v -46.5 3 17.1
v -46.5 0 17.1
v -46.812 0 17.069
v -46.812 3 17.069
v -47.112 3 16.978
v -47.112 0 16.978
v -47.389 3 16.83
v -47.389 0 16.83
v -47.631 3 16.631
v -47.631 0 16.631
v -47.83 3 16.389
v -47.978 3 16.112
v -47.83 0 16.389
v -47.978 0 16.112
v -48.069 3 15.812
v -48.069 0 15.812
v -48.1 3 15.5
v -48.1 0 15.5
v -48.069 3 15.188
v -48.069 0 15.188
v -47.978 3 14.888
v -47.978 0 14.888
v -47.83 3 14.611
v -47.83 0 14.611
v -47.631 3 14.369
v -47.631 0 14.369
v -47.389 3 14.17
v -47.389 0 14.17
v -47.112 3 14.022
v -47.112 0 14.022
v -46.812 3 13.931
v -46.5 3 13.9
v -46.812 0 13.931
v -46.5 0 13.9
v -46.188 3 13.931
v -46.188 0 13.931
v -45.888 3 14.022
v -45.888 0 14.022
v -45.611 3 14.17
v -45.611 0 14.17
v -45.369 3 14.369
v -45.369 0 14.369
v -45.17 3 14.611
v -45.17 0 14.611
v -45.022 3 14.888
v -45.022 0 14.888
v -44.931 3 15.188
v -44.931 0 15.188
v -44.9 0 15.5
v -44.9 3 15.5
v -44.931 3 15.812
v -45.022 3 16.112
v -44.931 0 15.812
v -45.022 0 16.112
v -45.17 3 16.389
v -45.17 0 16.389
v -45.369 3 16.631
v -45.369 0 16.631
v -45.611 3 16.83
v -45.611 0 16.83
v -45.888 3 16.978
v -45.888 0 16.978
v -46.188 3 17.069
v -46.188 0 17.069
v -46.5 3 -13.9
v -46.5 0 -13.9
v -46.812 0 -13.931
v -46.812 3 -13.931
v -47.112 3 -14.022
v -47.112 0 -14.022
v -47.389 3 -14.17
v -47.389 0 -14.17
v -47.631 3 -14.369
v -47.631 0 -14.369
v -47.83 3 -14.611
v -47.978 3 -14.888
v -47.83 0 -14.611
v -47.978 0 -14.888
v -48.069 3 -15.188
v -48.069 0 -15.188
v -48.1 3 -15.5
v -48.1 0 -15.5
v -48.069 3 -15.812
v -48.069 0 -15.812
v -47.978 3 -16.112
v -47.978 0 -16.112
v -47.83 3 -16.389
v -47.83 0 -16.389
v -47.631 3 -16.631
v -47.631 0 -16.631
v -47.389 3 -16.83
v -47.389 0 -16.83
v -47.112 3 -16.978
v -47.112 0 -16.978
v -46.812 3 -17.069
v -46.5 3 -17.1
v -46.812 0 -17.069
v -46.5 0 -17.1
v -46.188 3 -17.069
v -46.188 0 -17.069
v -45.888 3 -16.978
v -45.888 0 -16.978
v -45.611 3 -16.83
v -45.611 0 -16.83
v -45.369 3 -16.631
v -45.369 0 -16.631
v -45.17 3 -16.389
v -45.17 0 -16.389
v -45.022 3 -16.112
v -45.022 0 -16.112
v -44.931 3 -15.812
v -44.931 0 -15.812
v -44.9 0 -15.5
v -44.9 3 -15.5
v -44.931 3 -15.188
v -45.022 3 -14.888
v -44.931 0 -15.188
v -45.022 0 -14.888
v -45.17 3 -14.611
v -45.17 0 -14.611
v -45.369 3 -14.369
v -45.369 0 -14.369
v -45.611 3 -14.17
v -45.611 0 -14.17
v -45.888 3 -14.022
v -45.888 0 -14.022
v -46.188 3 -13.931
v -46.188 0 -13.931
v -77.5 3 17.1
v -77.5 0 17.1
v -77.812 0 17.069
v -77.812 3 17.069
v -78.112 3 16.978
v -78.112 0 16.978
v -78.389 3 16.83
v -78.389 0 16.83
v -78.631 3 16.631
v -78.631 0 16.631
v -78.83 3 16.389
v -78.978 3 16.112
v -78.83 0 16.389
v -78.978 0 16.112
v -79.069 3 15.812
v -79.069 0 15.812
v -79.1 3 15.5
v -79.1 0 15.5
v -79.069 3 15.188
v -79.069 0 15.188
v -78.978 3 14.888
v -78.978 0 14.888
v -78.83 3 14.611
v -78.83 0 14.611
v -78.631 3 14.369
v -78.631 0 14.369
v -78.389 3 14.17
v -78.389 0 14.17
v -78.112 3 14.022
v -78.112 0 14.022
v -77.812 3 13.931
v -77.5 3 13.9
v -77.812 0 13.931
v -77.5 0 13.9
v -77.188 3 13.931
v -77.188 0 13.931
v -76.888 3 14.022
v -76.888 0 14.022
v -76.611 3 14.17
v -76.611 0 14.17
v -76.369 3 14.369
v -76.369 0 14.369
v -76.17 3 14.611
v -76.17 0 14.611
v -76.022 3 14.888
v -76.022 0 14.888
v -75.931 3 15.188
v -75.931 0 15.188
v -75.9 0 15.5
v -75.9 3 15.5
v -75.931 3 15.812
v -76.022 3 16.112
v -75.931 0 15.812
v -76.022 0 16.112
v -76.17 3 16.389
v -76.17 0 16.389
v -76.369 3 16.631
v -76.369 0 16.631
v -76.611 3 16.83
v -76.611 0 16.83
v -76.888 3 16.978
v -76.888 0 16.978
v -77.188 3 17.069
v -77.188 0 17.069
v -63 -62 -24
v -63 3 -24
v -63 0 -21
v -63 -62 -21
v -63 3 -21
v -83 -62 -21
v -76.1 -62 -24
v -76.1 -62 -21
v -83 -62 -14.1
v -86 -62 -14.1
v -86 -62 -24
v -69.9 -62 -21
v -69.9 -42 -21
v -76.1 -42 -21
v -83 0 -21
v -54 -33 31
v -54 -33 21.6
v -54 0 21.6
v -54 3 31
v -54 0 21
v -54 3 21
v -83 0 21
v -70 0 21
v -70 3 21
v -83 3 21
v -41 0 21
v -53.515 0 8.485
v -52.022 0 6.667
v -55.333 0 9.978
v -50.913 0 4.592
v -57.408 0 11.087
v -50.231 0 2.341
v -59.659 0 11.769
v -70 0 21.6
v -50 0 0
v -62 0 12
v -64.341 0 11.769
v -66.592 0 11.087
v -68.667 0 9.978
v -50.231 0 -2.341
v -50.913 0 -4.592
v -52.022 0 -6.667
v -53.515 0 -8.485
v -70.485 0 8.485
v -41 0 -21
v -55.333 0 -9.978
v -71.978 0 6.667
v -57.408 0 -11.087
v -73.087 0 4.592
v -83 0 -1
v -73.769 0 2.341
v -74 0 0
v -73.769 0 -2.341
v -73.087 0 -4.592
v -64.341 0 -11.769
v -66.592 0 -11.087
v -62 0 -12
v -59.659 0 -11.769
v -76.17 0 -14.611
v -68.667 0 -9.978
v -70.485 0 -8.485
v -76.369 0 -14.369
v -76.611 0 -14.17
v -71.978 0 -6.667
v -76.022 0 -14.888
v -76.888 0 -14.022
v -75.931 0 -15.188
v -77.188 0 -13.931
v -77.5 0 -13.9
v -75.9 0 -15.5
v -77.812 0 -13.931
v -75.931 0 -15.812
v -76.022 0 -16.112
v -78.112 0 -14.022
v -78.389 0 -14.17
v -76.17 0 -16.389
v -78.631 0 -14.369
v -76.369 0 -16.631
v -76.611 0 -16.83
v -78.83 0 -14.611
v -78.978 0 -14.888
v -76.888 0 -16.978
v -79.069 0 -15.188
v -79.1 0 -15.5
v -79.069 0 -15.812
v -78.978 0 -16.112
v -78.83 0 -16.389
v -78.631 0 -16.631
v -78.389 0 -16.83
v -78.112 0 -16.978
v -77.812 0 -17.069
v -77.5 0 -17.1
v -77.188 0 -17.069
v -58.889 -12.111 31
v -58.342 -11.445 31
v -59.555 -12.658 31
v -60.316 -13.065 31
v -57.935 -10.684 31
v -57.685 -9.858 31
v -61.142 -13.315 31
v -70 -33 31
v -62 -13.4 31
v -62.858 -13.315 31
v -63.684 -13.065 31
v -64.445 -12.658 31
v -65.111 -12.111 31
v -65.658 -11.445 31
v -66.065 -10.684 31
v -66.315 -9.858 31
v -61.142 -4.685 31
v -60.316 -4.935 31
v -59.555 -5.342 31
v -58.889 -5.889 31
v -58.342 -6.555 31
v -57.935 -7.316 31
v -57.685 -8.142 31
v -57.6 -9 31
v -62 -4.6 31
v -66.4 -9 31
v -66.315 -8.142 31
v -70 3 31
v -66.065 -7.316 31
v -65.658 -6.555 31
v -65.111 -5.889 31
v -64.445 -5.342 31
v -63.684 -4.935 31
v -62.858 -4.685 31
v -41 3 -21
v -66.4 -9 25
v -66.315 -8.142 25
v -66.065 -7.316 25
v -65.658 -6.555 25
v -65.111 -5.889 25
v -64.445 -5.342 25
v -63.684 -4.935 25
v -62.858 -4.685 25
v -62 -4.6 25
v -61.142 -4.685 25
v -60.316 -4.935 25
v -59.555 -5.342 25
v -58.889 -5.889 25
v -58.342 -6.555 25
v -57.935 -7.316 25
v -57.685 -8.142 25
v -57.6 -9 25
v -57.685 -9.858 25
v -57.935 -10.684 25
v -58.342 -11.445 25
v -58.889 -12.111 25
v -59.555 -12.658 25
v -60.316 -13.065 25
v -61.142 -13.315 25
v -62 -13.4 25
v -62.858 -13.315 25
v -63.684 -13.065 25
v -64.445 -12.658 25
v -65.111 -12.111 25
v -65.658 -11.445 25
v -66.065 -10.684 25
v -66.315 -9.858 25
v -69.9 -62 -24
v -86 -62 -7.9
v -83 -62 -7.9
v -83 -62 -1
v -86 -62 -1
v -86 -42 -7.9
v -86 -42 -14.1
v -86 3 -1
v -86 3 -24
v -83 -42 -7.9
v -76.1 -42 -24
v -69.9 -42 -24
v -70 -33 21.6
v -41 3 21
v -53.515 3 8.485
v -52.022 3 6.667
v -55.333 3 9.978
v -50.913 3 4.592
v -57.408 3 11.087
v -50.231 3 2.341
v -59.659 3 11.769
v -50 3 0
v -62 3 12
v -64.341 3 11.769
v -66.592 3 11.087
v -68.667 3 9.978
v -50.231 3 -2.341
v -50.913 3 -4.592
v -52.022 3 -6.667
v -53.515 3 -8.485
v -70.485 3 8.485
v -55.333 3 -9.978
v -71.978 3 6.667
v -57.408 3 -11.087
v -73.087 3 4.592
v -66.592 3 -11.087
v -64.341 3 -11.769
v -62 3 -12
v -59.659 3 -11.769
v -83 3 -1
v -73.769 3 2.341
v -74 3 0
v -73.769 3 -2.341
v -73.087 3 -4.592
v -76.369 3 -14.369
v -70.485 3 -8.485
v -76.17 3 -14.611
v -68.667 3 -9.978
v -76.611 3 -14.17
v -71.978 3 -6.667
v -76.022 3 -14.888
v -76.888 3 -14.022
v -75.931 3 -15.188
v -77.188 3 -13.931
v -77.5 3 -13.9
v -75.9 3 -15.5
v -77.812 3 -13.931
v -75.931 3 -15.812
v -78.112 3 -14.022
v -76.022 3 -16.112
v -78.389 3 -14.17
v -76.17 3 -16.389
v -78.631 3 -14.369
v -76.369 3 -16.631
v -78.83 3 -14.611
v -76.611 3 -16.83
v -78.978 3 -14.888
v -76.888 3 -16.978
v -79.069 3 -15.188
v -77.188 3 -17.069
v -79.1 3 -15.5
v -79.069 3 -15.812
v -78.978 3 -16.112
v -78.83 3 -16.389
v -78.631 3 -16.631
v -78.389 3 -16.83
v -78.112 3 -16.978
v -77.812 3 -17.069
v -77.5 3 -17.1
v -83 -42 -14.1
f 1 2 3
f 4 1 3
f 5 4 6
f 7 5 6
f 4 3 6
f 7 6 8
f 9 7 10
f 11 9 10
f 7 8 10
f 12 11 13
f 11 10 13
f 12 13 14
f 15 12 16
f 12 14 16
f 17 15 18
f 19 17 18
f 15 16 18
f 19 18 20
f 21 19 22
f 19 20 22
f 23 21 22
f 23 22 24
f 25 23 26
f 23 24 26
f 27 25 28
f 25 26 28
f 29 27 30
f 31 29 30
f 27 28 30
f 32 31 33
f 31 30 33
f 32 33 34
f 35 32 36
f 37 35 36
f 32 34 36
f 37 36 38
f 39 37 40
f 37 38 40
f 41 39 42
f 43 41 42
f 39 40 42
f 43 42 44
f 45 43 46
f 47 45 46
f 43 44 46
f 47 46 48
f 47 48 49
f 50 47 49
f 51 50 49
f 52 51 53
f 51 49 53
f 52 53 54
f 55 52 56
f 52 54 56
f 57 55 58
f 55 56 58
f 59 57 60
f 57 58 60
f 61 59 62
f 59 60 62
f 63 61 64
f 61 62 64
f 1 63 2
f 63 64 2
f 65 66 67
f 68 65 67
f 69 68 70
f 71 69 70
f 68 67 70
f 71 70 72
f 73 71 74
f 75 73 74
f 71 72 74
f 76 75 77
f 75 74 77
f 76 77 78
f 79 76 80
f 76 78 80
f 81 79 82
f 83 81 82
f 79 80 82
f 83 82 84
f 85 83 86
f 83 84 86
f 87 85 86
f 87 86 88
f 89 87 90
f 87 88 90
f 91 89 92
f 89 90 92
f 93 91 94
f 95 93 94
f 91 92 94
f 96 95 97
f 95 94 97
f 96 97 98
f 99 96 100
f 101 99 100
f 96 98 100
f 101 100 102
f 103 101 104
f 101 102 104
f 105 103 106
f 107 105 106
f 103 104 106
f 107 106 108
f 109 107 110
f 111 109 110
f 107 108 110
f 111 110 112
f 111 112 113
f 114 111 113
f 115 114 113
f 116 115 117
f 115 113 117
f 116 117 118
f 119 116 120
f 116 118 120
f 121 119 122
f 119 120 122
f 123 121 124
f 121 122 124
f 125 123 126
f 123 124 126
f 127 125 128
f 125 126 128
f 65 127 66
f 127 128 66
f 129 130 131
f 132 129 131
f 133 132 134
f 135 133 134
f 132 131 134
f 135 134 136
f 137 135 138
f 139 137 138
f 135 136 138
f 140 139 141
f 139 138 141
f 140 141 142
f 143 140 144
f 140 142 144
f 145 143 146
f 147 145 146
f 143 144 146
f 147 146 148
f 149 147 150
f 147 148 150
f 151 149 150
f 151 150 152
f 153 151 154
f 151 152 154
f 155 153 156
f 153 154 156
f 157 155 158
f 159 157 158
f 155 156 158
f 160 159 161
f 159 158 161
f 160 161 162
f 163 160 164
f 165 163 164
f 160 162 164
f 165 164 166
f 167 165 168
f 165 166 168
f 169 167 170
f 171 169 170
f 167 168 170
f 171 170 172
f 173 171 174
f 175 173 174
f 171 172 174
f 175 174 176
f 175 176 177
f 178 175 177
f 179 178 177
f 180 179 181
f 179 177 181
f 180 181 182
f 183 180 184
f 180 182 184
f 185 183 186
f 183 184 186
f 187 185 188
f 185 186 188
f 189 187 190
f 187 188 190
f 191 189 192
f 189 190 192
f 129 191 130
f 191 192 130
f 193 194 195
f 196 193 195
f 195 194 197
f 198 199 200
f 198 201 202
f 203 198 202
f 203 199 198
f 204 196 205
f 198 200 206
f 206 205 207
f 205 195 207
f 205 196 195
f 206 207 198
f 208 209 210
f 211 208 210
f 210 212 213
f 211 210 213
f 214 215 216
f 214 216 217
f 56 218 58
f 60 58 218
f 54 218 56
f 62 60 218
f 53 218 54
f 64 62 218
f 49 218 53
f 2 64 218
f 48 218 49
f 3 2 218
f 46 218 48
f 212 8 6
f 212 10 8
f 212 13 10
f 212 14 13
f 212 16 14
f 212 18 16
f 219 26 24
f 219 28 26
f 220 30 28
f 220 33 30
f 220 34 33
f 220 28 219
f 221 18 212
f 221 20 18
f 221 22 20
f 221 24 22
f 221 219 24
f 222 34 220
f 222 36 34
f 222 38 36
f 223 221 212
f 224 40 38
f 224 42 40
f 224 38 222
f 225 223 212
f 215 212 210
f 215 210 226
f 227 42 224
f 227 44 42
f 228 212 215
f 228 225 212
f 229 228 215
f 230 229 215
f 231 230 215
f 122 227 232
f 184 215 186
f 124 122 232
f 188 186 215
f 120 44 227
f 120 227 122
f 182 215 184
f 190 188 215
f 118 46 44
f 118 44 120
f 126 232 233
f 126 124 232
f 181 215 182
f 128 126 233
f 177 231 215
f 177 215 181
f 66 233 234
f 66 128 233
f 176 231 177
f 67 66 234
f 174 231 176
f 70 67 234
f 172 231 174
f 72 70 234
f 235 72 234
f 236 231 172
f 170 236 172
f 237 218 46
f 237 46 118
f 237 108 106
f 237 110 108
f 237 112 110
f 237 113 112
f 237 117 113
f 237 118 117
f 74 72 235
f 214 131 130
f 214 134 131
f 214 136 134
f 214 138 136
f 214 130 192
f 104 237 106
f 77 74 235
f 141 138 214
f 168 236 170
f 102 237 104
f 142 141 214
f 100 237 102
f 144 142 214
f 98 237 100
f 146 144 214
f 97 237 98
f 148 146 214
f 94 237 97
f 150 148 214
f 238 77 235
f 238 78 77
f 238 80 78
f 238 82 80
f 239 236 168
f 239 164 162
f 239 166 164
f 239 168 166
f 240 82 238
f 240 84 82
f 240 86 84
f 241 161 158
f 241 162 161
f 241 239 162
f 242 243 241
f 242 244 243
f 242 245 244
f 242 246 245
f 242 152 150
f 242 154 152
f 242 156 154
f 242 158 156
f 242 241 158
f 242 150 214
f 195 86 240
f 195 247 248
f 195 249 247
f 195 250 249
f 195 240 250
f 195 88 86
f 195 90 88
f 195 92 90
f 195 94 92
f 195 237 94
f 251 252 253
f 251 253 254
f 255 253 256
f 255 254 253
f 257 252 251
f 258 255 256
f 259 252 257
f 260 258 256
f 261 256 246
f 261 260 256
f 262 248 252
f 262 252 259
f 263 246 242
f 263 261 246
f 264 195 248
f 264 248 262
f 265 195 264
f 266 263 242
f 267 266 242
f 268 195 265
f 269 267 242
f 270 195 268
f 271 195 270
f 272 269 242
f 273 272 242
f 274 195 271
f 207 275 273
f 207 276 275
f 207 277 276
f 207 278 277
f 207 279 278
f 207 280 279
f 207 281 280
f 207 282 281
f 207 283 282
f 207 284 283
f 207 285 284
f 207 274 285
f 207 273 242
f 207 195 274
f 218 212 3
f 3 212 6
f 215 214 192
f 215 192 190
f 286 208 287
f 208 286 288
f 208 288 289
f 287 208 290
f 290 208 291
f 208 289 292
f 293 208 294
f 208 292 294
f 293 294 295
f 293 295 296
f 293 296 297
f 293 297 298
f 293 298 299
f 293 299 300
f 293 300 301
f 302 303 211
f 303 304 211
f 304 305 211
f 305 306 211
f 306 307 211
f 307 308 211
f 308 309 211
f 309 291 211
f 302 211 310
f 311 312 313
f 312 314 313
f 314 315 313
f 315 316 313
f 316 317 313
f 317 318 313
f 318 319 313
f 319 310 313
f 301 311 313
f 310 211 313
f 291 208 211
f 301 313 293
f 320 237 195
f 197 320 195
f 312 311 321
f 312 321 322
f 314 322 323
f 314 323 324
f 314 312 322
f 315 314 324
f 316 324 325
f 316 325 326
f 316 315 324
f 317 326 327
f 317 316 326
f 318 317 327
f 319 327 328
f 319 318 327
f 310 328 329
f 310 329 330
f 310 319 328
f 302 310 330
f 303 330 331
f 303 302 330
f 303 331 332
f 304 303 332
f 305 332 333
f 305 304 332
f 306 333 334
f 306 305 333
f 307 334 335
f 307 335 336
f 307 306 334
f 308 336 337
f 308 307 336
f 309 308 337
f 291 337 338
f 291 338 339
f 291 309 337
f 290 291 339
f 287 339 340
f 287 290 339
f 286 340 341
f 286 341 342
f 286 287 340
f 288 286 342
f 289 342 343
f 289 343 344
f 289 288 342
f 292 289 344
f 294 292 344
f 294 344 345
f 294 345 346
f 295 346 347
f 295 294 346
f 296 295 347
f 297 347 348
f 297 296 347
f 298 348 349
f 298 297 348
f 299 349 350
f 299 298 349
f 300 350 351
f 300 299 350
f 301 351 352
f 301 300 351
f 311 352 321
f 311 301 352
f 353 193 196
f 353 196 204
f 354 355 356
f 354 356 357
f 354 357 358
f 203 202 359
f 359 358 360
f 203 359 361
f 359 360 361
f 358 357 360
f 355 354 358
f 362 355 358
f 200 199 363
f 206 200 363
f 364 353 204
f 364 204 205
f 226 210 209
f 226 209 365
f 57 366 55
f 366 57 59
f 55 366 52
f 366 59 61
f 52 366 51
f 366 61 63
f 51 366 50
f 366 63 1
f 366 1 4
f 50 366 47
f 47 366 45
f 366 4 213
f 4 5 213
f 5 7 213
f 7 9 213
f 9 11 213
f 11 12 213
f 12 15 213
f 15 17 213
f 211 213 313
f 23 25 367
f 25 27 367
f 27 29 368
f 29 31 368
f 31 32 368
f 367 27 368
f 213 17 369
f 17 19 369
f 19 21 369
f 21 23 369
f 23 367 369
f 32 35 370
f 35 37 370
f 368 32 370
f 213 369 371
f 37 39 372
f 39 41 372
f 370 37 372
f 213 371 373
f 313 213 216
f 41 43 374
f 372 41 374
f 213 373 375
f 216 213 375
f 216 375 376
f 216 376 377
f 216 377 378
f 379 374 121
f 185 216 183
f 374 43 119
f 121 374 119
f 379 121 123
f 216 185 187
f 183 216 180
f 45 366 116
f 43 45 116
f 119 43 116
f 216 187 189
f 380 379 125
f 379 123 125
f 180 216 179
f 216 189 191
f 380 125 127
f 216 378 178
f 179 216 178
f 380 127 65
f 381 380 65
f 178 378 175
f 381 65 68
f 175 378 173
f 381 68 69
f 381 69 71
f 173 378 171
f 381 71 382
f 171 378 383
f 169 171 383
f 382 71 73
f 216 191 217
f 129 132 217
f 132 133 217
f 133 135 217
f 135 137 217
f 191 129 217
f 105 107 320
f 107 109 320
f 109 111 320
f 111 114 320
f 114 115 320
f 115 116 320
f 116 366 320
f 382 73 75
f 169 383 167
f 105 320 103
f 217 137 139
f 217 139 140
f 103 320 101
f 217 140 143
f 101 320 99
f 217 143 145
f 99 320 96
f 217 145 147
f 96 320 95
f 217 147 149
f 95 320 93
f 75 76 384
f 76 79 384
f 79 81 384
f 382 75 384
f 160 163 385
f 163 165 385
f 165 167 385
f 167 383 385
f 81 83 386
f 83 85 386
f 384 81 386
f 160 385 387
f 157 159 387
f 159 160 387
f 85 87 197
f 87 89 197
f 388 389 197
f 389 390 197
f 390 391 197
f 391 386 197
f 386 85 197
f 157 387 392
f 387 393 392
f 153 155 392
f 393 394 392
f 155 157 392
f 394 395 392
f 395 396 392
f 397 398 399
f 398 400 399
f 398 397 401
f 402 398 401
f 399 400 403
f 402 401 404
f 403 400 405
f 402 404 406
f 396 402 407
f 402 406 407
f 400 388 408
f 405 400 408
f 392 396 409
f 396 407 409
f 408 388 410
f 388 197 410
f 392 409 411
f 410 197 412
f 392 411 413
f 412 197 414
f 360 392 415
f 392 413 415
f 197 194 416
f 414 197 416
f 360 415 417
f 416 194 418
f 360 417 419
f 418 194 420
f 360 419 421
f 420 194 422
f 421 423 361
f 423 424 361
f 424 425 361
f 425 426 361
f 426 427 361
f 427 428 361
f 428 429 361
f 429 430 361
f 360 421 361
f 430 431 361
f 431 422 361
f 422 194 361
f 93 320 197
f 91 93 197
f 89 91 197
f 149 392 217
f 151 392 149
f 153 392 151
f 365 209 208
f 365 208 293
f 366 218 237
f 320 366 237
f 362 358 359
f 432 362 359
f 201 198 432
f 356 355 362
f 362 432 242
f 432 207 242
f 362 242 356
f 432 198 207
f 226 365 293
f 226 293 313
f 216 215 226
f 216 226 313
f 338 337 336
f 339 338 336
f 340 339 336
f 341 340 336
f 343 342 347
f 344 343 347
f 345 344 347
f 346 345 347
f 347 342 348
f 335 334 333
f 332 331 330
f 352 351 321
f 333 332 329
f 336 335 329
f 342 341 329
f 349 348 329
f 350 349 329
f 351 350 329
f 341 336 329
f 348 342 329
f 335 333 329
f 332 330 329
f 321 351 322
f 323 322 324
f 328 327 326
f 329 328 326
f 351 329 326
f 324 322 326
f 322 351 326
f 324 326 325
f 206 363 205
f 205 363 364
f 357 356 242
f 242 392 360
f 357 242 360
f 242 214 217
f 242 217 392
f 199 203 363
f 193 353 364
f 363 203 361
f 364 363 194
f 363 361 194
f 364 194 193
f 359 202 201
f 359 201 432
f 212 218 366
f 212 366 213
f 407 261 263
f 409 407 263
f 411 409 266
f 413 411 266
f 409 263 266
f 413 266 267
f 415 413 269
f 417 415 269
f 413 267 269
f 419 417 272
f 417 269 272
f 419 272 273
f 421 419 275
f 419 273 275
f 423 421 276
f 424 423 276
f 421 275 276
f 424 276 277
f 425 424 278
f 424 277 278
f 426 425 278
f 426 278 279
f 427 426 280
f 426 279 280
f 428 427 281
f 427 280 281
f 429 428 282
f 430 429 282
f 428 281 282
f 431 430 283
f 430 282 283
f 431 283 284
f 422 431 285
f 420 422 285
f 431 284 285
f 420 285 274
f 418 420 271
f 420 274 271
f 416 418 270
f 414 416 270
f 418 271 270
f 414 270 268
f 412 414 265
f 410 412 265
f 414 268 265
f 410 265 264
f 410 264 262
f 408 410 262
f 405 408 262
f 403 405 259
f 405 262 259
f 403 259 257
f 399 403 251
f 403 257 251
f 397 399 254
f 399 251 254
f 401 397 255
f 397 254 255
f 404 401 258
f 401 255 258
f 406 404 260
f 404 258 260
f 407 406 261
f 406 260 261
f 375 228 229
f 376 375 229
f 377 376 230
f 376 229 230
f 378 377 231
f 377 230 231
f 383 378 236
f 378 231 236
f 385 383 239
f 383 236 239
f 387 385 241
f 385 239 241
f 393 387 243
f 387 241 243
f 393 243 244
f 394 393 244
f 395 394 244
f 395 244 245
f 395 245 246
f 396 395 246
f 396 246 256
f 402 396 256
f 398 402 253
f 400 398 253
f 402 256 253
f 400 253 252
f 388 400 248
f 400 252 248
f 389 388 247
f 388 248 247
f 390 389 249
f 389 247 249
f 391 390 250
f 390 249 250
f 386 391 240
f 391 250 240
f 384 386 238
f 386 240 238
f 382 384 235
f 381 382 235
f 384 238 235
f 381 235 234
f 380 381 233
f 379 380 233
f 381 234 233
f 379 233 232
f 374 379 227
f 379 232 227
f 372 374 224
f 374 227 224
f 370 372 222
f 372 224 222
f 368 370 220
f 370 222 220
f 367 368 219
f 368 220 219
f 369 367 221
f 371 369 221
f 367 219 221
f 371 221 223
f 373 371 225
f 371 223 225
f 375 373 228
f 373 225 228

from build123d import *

# Parameters (mm, degrees)
SKETCH_1_W          = 42
SKETCH_1_H          = 42
SKETCH_1_R          = 1.6
SKETCH_1_R_2        = 12
EXTRUDE_1_DEPTH     = 3
SKETCH_2_W          = 16
SKETCH_2_H          = 36
EXTRUDE_2_DEPTH     = 10
SKETCH_3_R          = 4.4
CUT_EXTRUDE_1_DEPTH = 6
EXTRUDE_3_DEPTH     = 65
SKETCH_5_W          = 6.2
SKETCH_5_H          = 20
CUT_EXTRUDE_2_DEPTH = 50
CUT_EXTRUDE_3_REACH = 84.644
SKETCH_6_W          = 6.2
SKETCH_6_H          = 20
SKETCH_7_W          = 16
SKETCH_7_H          = 0.6
CUT_EXTRUDE_4_DEPTH = 33


with BuildPart() as part:
    # 草图1 → 凸台-拉伸1 (new body)
    with BuildSketch(Plane(origin=(0, 0, 0), x_dir=(1, 0, 0), z_dir=(0, 1, 0))):
        Rectangle(SKETCH_1_W, SKETCH_1_H)
        with Locations(Location((15.5, 15.5, 0), (0, 0, 270))):
            Circle(SKETCH_1_R, mode=Mode.SUBTRACT)
        with Locations(Location((15.5, -15.5, 0), (0, 0, 270))):
            Circle(SKETCH_1_R, mode=Mode.SUBTRACT)
        with Locations(Location((-15.5, -15.5, 0), (0, 0, 270))):
            Circle(SKETCH_1_R, mode=Mode.SUBTRACT)
        with Locations(Location((-15.5, 15.5, 0), (0, 0, 270))):
            Circle(SKETCH_1_R, mode=Mode.SUBTRACT)
        with Locations(Location((0, 0, 0), (0, 0, 270))):
            Circle(SKETCH_1_R_2, mode=Mode.SUBTRACT)
    extrude(amount=EXTRUDE_1_DEPTH)

    # 草图2 → 凸台-拉伸2 (add)
    with BuildSketch(Plane.XY.offset(21)):
        with Locations((0, -15)):
            Rectangle(SKETCH_2_W, SKETCH_2_H)
    extrude(amount=EXTRUDE_2_DEPTH)

    # 草图3 → 切除-拉伸1 (cut)
    with BuildSketch(Plane.XY.offset(31)):
        with Locations((0, -9)):
            Circle(SKETCH_3_R)
    extrude(amount=-CUT_EXTRUDE_1_DEPTH, mode=Mode.SUBTRACT)

    # 草图4 → 凸台-拉伸3 (add)
    with BuildSketch(Plane(origin=(0, 3, 0), x_dir=(1, 0, 0), z_dir=(0, 1, 0))):
        Polygon((1, 21), (21, 21), (21, 1), (24, 1), (24, 24), (1, 24), align=None)
    extrude(amount=-EXTRUDE_3_DEPTH)

    # 草图5 → 切除-拉伸2 (cut)
    with BuildSketch(Plane(origin=(0, 0, -24), x_dir=(-1, 0, 0), z_dir=(0, 0, -1))):
        with Locations((-11, -52)):
            Rectangle(SKETCH_5_W, SKETCH_5_H)
    extrude(amount=-CUT_EXTRUDE_2_DEPTH, mode=Mode.SUBTRACT)

    # 草图6 → 切除-拉伸3 (cut, up to next)
    with BuildSketch(Plane(origin=(24, 0, 0), x_dir=(0, 0, -1), z_dir=(1, 0, 0)), mode=Mode.PRIVATE) as cut_extrude_3_sk1:
        with Locations((11, -52)):
            Rectangle(SKETCH_6_W, SKETCH_6_H)
    cut_extrude_3_tool1 = extrude(cut_extrude_3_sk1.sketch, amount=-CUT_EXTRUDE_3_REACH, mode=Mode.PRIVATE) & part.part
    add(cut_extrude_3_tool1.solids().sort_by_distance((24, -52, -11))[0], mode=Mode.SUBTRACT)

    # 草图7 → 切除-拉伸4 (cut)
    with BuildSketch(Plane.XZ.offset(33)):
        with Locations((0, 21.3)):
            Rectangle(SKETCH_7_W, SKETCH_7_H)
    extrude(amount=-CUT_EXTRUDE_4_DEPTH, mode=Mode.SUBTRACT)


with BuildPart() as body_2:
    # 镜向3: mirrored copy
    add(part.part.mirror(Plane.ZY.offset(31)))


solid = body_2.part
